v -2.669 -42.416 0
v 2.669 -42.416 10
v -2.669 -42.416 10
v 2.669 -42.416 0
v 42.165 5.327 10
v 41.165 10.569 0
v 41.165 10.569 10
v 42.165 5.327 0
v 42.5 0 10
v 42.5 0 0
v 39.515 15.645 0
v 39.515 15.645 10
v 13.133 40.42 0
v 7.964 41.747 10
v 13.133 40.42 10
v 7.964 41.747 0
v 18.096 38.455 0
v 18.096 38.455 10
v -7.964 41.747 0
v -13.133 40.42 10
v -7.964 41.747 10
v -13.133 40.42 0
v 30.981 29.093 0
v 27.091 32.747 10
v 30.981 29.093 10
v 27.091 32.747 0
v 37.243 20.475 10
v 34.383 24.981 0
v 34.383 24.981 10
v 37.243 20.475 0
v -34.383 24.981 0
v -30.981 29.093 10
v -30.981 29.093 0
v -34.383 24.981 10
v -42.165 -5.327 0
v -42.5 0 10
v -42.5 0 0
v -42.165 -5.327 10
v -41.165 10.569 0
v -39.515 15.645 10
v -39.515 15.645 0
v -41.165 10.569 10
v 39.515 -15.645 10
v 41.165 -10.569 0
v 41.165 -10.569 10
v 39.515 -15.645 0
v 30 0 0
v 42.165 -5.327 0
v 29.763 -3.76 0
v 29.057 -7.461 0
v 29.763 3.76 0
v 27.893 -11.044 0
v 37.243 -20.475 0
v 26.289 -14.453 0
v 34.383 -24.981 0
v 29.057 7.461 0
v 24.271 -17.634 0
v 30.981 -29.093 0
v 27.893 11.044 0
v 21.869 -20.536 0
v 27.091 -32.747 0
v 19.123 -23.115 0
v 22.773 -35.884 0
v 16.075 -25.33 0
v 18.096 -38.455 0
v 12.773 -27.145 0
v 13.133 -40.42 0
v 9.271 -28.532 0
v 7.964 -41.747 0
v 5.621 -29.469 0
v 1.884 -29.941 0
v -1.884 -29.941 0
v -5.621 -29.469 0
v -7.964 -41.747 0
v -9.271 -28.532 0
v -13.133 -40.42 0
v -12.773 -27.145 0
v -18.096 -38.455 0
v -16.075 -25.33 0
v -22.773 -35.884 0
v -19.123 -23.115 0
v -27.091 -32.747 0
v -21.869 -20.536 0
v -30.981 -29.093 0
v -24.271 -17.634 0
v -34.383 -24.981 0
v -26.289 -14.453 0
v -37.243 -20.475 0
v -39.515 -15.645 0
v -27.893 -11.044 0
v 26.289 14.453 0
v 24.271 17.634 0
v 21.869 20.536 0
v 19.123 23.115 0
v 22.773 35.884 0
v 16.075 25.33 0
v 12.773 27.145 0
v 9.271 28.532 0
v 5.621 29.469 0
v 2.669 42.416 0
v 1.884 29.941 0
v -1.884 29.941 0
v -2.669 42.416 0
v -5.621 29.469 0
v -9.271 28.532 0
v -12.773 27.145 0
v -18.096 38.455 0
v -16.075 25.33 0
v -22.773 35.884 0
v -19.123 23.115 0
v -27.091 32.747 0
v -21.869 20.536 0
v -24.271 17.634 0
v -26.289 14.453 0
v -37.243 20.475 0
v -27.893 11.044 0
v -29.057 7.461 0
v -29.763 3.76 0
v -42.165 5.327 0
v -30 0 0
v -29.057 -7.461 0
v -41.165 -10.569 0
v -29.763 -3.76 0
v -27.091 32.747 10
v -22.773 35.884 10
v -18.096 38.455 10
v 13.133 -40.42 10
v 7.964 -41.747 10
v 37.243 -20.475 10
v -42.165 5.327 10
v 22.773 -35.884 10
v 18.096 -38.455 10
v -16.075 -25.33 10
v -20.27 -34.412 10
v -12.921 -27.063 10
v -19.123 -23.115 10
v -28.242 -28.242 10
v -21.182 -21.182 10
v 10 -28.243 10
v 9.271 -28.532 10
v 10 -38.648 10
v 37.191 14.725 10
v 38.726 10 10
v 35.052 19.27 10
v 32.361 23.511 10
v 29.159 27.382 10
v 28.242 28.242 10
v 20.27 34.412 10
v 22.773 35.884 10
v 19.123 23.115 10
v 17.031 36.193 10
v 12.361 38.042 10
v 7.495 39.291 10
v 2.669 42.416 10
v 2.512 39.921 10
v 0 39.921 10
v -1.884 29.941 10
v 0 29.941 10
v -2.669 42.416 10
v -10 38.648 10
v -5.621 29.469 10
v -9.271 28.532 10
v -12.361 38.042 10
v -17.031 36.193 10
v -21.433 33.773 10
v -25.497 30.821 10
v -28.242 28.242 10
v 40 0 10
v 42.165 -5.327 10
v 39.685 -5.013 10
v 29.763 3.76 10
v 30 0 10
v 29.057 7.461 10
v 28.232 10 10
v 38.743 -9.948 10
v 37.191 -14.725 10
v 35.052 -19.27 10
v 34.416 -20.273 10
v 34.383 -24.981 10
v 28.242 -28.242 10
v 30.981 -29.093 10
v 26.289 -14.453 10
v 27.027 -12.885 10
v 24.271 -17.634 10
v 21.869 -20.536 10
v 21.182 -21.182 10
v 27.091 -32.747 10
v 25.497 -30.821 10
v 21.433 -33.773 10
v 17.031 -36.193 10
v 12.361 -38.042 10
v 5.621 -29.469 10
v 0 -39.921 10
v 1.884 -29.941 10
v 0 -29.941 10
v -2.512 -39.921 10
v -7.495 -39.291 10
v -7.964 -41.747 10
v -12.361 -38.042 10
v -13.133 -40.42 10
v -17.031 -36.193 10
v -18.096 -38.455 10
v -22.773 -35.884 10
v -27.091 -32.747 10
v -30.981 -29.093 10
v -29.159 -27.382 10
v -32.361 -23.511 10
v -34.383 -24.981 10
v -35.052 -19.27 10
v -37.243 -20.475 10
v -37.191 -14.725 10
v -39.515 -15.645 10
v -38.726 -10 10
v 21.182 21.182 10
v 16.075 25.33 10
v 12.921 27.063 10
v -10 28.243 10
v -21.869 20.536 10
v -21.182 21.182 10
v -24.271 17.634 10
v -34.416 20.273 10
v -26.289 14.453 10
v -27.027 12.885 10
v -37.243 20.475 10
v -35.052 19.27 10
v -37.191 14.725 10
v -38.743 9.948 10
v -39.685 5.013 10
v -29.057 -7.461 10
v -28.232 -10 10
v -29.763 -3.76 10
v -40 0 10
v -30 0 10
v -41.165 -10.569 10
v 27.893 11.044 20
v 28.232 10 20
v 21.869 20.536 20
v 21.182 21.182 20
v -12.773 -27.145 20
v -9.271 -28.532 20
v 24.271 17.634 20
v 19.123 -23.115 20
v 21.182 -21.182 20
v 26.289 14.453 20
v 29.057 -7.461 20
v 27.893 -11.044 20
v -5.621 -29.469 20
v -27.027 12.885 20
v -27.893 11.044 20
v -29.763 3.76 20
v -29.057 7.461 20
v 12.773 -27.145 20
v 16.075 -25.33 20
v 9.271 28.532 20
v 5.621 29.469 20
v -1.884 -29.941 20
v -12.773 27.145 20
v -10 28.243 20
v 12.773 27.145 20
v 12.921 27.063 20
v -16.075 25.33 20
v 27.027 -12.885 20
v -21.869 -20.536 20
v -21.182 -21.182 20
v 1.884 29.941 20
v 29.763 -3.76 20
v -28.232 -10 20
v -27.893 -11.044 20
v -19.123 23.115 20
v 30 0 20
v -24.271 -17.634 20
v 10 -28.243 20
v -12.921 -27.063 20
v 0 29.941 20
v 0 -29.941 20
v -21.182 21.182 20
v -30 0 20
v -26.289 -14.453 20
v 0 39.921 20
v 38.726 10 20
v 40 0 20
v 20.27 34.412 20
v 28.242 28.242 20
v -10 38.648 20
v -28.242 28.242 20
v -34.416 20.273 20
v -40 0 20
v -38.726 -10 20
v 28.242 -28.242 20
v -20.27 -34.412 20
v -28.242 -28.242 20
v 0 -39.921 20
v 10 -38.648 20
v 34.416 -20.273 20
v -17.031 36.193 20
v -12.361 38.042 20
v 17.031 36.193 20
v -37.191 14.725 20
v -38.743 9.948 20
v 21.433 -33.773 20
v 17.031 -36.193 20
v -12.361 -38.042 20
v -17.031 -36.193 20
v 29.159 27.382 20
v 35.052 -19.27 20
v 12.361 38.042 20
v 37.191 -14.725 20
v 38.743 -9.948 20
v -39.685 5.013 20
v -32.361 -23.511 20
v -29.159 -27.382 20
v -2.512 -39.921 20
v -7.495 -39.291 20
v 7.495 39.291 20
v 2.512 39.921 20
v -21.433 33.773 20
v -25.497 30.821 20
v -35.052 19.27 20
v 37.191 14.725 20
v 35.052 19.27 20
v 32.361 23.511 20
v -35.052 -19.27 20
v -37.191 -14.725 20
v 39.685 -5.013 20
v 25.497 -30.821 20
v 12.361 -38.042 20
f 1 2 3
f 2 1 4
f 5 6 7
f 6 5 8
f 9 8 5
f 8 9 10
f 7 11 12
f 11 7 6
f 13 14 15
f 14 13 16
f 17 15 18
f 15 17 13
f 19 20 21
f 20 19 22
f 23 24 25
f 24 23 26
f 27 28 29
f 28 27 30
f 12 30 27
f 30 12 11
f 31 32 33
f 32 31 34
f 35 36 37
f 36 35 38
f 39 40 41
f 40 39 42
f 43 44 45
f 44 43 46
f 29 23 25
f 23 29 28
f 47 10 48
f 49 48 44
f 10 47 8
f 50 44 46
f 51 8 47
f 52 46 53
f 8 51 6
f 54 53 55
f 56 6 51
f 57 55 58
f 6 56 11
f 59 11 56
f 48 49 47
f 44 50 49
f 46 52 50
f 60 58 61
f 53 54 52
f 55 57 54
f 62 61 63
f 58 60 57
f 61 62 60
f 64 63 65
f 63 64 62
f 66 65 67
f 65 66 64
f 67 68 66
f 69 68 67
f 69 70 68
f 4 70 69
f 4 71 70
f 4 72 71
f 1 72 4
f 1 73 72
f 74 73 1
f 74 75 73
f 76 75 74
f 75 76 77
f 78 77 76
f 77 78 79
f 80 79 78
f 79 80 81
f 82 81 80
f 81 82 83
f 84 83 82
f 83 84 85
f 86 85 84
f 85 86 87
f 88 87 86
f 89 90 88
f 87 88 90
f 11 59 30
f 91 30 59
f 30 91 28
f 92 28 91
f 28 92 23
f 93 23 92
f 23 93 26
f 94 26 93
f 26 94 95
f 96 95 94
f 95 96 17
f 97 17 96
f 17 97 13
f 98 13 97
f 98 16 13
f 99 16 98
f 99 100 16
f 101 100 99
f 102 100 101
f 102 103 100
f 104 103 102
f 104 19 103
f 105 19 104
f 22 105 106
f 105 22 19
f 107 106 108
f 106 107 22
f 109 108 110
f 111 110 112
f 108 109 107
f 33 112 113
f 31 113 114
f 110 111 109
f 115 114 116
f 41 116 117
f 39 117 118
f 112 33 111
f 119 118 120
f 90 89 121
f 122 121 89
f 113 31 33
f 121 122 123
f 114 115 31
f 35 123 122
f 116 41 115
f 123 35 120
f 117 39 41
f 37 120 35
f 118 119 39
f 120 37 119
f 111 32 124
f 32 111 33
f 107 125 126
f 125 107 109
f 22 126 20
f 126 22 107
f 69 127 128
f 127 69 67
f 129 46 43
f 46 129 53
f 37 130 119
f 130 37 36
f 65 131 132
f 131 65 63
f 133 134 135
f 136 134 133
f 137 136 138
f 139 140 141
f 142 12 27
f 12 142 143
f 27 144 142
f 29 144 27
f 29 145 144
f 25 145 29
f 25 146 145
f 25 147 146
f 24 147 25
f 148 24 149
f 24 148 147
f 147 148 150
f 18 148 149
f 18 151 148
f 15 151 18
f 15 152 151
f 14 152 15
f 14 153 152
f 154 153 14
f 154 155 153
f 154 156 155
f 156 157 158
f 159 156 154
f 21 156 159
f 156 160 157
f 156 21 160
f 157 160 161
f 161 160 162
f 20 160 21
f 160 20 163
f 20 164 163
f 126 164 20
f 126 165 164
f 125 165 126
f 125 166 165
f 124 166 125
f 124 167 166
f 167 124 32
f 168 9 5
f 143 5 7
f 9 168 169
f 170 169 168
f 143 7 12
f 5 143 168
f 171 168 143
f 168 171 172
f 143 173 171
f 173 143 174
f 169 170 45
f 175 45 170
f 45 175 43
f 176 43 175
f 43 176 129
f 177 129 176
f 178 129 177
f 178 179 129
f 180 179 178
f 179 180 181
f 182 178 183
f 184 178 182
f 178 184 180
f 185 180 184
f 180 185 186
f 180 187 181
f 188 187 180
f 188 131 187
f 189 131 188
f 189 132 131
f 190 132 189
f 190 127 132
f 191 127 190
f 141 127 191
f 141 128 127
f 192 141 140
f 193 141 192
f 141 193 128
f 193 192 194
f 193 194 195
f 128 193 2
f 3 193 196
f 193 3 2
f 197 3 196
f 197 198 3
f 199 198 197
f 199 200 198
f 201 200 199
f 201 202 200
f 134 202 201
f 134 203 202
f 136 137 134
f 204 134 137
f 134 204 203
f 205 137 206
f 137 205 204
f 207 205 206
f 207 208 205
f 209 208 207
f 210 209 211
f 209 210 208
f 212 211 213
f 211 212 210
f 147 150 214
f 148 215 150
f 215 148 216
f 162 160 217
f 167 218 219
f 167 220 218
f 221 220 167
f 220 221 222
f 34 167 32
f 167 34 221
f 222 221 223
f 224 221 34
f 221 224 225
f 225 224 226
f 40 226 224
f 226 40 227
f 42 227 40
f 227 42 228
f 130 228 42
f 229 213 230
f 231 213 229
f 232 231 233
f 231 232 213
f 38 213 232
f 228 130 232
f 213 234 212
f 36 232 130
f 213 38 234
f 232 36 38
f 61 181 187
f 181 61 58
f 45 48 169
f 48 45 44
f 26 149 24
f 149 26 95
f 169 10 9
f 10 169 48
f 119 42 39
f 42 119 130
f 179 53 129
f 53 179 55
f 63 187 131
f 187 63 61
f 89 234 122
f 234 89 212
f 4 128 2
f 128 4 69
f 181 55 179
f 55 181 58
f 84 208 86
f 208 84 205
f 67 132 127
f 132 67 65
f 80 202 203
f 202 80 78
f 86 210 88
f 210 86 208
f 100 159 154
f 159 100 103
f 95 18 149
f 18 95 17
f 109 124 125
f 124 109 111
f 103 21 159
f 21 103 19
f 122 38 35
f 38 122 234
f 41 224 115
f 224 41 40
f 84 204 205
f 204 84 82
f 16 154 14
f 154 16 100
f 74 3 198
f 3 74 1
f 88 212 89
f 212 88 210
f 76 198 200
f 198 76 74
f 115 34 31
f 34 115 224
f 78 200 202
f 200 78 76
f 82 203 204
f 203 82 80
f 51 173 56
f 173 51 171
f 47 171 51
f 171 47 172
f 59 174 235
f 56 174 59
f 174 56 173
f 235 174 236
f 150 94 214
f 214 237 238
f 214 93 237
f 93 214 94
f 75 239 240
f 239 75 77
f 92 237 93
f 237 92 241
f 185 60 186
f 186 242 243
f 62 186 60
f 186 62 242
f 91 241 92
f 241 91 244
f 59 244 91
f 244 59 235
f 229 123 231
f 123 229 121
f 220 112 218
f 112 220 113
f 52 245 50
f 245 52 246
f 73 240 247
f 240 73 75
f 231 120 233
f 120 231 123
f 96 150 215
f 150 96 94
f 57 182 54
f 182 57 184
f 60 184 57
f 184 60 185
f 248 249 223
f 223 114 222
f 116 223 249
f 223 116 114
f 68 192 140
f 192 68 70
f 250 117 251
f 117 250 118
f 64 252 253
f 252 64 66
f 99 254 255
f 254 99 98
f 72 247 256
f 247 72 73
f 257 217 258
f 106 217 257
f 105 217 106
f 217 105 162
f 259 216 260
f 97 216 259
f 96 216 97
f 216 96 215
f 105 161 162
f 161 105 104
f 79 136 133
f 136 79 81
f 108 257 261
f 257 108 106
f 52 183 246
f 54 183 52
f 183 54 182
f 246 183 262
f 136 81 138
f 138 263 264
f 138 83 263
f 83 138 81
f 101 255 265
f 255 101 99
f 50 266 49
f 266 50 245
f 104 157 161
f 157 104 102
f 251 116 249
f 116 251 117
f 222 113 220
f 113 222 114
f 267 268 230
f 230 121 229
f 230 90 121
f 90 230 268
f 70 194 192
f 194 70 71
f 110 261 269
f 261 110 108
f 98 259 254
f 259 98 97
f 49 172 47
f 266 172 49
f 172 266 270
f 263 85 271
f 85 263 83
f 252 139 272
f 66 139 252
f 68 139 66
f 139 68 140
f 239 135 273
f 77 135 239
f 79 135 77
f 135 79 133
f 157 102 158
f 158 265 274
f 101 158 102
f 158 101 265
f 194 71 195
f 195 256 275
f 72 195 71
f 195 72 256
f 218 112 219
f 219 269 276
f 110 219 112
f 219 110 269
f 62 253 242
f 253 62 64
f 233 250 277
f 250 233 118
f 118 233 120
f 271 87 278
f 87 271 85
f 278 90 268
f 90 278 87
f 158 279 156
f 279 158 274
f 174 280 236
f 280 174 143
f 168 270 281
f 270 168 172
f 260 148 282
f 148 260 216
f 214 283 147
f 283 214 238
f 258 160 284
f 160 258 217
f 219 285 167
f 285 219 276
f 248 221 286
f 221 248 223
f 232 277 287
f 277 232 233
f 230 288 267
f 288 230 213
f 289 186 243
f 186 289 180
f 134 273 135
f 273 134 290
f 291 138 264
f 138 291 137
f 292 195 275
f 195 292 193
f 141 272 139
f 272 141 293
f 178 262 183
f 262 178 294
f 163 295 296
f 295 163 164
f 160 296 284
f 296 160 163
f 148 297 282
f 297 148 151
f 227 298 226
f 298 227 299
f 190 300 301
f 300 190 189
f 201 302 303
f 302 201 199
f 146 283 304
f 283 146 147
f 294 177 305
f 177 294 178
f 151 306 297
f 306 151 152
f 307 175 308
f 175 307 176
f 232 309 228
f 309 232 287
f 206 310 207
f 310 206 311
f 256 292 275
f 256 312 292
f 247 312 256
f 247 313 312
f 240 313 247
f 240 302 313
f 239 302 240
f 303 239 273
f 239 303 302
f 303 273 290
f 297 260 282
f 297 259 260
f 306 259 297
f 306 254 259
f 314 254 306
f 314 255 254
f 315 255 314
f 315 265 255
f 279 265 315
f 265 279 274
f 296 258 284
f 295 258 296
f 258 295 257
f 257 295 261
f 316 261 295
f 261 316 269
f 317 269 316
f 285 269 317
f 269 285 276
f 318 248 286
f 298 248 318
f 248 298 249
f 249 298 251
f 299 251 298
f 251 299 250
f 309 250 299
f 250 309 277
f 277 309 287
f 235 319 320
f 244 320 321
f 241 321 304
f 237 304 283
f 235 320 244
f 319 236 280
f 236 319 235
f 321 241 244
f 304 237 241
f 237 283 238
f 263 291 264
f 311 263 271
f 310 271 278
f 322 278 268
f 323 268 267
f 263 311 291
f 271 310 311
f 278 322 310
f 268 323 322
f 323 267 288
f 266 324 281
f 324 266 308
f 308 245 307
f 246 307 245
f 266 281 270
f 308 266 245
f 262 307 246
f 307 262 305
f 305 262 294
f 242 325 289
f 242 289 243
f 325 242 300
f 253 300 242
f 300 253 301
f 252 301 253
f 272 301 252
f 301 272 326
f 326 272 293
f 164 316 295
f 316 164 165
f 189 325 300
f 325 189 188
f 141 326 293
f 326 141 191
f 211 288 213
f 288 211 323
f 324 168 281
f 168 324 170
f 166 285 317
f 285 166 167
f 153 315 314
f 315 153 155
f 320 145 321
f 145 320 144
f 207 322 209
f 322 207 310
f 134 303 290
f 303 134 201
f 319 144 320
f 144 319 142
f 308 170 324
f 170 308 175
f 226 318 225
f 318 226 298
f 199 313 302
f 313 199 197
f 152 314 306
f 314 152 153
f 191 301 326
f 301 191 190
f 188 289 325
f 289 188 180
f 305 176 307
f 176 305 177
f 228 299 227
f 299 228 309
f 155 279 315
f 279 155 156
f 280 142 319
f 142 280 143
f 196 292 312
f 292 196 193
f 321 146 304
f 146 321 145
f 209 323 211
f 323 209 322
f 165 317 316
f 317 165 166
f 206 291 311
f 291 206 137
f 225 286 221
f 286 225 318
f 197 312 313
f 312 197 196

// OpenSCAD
//Adapter für hohe Orchideentöpfe
//height adjuster for orchid plant pots
//20180604 P. de Graaff

$fn=50;
Durchmesser=85;     //outer diameter of adjuster
DurchmesserTopf=80; //outer diameter plant pot
Hoehe=20;           //total height of adjuster
difference(){
    cylinder(d=Durchmesser,h=10);
    cylinder(d=DurchmesserTopf-20,h=Hoehe+1);
}
translate([0,0,10]) difference(){
    cylinder(d=DurchmesserTopf,h=Hoehe-10);
    cylinder(d=DurchmesserTopf-20,h=Hoehe+1);
    for (i =[0:8]){
        rotate([0,0,i*45])cube([50,10,50]);
    }
}
